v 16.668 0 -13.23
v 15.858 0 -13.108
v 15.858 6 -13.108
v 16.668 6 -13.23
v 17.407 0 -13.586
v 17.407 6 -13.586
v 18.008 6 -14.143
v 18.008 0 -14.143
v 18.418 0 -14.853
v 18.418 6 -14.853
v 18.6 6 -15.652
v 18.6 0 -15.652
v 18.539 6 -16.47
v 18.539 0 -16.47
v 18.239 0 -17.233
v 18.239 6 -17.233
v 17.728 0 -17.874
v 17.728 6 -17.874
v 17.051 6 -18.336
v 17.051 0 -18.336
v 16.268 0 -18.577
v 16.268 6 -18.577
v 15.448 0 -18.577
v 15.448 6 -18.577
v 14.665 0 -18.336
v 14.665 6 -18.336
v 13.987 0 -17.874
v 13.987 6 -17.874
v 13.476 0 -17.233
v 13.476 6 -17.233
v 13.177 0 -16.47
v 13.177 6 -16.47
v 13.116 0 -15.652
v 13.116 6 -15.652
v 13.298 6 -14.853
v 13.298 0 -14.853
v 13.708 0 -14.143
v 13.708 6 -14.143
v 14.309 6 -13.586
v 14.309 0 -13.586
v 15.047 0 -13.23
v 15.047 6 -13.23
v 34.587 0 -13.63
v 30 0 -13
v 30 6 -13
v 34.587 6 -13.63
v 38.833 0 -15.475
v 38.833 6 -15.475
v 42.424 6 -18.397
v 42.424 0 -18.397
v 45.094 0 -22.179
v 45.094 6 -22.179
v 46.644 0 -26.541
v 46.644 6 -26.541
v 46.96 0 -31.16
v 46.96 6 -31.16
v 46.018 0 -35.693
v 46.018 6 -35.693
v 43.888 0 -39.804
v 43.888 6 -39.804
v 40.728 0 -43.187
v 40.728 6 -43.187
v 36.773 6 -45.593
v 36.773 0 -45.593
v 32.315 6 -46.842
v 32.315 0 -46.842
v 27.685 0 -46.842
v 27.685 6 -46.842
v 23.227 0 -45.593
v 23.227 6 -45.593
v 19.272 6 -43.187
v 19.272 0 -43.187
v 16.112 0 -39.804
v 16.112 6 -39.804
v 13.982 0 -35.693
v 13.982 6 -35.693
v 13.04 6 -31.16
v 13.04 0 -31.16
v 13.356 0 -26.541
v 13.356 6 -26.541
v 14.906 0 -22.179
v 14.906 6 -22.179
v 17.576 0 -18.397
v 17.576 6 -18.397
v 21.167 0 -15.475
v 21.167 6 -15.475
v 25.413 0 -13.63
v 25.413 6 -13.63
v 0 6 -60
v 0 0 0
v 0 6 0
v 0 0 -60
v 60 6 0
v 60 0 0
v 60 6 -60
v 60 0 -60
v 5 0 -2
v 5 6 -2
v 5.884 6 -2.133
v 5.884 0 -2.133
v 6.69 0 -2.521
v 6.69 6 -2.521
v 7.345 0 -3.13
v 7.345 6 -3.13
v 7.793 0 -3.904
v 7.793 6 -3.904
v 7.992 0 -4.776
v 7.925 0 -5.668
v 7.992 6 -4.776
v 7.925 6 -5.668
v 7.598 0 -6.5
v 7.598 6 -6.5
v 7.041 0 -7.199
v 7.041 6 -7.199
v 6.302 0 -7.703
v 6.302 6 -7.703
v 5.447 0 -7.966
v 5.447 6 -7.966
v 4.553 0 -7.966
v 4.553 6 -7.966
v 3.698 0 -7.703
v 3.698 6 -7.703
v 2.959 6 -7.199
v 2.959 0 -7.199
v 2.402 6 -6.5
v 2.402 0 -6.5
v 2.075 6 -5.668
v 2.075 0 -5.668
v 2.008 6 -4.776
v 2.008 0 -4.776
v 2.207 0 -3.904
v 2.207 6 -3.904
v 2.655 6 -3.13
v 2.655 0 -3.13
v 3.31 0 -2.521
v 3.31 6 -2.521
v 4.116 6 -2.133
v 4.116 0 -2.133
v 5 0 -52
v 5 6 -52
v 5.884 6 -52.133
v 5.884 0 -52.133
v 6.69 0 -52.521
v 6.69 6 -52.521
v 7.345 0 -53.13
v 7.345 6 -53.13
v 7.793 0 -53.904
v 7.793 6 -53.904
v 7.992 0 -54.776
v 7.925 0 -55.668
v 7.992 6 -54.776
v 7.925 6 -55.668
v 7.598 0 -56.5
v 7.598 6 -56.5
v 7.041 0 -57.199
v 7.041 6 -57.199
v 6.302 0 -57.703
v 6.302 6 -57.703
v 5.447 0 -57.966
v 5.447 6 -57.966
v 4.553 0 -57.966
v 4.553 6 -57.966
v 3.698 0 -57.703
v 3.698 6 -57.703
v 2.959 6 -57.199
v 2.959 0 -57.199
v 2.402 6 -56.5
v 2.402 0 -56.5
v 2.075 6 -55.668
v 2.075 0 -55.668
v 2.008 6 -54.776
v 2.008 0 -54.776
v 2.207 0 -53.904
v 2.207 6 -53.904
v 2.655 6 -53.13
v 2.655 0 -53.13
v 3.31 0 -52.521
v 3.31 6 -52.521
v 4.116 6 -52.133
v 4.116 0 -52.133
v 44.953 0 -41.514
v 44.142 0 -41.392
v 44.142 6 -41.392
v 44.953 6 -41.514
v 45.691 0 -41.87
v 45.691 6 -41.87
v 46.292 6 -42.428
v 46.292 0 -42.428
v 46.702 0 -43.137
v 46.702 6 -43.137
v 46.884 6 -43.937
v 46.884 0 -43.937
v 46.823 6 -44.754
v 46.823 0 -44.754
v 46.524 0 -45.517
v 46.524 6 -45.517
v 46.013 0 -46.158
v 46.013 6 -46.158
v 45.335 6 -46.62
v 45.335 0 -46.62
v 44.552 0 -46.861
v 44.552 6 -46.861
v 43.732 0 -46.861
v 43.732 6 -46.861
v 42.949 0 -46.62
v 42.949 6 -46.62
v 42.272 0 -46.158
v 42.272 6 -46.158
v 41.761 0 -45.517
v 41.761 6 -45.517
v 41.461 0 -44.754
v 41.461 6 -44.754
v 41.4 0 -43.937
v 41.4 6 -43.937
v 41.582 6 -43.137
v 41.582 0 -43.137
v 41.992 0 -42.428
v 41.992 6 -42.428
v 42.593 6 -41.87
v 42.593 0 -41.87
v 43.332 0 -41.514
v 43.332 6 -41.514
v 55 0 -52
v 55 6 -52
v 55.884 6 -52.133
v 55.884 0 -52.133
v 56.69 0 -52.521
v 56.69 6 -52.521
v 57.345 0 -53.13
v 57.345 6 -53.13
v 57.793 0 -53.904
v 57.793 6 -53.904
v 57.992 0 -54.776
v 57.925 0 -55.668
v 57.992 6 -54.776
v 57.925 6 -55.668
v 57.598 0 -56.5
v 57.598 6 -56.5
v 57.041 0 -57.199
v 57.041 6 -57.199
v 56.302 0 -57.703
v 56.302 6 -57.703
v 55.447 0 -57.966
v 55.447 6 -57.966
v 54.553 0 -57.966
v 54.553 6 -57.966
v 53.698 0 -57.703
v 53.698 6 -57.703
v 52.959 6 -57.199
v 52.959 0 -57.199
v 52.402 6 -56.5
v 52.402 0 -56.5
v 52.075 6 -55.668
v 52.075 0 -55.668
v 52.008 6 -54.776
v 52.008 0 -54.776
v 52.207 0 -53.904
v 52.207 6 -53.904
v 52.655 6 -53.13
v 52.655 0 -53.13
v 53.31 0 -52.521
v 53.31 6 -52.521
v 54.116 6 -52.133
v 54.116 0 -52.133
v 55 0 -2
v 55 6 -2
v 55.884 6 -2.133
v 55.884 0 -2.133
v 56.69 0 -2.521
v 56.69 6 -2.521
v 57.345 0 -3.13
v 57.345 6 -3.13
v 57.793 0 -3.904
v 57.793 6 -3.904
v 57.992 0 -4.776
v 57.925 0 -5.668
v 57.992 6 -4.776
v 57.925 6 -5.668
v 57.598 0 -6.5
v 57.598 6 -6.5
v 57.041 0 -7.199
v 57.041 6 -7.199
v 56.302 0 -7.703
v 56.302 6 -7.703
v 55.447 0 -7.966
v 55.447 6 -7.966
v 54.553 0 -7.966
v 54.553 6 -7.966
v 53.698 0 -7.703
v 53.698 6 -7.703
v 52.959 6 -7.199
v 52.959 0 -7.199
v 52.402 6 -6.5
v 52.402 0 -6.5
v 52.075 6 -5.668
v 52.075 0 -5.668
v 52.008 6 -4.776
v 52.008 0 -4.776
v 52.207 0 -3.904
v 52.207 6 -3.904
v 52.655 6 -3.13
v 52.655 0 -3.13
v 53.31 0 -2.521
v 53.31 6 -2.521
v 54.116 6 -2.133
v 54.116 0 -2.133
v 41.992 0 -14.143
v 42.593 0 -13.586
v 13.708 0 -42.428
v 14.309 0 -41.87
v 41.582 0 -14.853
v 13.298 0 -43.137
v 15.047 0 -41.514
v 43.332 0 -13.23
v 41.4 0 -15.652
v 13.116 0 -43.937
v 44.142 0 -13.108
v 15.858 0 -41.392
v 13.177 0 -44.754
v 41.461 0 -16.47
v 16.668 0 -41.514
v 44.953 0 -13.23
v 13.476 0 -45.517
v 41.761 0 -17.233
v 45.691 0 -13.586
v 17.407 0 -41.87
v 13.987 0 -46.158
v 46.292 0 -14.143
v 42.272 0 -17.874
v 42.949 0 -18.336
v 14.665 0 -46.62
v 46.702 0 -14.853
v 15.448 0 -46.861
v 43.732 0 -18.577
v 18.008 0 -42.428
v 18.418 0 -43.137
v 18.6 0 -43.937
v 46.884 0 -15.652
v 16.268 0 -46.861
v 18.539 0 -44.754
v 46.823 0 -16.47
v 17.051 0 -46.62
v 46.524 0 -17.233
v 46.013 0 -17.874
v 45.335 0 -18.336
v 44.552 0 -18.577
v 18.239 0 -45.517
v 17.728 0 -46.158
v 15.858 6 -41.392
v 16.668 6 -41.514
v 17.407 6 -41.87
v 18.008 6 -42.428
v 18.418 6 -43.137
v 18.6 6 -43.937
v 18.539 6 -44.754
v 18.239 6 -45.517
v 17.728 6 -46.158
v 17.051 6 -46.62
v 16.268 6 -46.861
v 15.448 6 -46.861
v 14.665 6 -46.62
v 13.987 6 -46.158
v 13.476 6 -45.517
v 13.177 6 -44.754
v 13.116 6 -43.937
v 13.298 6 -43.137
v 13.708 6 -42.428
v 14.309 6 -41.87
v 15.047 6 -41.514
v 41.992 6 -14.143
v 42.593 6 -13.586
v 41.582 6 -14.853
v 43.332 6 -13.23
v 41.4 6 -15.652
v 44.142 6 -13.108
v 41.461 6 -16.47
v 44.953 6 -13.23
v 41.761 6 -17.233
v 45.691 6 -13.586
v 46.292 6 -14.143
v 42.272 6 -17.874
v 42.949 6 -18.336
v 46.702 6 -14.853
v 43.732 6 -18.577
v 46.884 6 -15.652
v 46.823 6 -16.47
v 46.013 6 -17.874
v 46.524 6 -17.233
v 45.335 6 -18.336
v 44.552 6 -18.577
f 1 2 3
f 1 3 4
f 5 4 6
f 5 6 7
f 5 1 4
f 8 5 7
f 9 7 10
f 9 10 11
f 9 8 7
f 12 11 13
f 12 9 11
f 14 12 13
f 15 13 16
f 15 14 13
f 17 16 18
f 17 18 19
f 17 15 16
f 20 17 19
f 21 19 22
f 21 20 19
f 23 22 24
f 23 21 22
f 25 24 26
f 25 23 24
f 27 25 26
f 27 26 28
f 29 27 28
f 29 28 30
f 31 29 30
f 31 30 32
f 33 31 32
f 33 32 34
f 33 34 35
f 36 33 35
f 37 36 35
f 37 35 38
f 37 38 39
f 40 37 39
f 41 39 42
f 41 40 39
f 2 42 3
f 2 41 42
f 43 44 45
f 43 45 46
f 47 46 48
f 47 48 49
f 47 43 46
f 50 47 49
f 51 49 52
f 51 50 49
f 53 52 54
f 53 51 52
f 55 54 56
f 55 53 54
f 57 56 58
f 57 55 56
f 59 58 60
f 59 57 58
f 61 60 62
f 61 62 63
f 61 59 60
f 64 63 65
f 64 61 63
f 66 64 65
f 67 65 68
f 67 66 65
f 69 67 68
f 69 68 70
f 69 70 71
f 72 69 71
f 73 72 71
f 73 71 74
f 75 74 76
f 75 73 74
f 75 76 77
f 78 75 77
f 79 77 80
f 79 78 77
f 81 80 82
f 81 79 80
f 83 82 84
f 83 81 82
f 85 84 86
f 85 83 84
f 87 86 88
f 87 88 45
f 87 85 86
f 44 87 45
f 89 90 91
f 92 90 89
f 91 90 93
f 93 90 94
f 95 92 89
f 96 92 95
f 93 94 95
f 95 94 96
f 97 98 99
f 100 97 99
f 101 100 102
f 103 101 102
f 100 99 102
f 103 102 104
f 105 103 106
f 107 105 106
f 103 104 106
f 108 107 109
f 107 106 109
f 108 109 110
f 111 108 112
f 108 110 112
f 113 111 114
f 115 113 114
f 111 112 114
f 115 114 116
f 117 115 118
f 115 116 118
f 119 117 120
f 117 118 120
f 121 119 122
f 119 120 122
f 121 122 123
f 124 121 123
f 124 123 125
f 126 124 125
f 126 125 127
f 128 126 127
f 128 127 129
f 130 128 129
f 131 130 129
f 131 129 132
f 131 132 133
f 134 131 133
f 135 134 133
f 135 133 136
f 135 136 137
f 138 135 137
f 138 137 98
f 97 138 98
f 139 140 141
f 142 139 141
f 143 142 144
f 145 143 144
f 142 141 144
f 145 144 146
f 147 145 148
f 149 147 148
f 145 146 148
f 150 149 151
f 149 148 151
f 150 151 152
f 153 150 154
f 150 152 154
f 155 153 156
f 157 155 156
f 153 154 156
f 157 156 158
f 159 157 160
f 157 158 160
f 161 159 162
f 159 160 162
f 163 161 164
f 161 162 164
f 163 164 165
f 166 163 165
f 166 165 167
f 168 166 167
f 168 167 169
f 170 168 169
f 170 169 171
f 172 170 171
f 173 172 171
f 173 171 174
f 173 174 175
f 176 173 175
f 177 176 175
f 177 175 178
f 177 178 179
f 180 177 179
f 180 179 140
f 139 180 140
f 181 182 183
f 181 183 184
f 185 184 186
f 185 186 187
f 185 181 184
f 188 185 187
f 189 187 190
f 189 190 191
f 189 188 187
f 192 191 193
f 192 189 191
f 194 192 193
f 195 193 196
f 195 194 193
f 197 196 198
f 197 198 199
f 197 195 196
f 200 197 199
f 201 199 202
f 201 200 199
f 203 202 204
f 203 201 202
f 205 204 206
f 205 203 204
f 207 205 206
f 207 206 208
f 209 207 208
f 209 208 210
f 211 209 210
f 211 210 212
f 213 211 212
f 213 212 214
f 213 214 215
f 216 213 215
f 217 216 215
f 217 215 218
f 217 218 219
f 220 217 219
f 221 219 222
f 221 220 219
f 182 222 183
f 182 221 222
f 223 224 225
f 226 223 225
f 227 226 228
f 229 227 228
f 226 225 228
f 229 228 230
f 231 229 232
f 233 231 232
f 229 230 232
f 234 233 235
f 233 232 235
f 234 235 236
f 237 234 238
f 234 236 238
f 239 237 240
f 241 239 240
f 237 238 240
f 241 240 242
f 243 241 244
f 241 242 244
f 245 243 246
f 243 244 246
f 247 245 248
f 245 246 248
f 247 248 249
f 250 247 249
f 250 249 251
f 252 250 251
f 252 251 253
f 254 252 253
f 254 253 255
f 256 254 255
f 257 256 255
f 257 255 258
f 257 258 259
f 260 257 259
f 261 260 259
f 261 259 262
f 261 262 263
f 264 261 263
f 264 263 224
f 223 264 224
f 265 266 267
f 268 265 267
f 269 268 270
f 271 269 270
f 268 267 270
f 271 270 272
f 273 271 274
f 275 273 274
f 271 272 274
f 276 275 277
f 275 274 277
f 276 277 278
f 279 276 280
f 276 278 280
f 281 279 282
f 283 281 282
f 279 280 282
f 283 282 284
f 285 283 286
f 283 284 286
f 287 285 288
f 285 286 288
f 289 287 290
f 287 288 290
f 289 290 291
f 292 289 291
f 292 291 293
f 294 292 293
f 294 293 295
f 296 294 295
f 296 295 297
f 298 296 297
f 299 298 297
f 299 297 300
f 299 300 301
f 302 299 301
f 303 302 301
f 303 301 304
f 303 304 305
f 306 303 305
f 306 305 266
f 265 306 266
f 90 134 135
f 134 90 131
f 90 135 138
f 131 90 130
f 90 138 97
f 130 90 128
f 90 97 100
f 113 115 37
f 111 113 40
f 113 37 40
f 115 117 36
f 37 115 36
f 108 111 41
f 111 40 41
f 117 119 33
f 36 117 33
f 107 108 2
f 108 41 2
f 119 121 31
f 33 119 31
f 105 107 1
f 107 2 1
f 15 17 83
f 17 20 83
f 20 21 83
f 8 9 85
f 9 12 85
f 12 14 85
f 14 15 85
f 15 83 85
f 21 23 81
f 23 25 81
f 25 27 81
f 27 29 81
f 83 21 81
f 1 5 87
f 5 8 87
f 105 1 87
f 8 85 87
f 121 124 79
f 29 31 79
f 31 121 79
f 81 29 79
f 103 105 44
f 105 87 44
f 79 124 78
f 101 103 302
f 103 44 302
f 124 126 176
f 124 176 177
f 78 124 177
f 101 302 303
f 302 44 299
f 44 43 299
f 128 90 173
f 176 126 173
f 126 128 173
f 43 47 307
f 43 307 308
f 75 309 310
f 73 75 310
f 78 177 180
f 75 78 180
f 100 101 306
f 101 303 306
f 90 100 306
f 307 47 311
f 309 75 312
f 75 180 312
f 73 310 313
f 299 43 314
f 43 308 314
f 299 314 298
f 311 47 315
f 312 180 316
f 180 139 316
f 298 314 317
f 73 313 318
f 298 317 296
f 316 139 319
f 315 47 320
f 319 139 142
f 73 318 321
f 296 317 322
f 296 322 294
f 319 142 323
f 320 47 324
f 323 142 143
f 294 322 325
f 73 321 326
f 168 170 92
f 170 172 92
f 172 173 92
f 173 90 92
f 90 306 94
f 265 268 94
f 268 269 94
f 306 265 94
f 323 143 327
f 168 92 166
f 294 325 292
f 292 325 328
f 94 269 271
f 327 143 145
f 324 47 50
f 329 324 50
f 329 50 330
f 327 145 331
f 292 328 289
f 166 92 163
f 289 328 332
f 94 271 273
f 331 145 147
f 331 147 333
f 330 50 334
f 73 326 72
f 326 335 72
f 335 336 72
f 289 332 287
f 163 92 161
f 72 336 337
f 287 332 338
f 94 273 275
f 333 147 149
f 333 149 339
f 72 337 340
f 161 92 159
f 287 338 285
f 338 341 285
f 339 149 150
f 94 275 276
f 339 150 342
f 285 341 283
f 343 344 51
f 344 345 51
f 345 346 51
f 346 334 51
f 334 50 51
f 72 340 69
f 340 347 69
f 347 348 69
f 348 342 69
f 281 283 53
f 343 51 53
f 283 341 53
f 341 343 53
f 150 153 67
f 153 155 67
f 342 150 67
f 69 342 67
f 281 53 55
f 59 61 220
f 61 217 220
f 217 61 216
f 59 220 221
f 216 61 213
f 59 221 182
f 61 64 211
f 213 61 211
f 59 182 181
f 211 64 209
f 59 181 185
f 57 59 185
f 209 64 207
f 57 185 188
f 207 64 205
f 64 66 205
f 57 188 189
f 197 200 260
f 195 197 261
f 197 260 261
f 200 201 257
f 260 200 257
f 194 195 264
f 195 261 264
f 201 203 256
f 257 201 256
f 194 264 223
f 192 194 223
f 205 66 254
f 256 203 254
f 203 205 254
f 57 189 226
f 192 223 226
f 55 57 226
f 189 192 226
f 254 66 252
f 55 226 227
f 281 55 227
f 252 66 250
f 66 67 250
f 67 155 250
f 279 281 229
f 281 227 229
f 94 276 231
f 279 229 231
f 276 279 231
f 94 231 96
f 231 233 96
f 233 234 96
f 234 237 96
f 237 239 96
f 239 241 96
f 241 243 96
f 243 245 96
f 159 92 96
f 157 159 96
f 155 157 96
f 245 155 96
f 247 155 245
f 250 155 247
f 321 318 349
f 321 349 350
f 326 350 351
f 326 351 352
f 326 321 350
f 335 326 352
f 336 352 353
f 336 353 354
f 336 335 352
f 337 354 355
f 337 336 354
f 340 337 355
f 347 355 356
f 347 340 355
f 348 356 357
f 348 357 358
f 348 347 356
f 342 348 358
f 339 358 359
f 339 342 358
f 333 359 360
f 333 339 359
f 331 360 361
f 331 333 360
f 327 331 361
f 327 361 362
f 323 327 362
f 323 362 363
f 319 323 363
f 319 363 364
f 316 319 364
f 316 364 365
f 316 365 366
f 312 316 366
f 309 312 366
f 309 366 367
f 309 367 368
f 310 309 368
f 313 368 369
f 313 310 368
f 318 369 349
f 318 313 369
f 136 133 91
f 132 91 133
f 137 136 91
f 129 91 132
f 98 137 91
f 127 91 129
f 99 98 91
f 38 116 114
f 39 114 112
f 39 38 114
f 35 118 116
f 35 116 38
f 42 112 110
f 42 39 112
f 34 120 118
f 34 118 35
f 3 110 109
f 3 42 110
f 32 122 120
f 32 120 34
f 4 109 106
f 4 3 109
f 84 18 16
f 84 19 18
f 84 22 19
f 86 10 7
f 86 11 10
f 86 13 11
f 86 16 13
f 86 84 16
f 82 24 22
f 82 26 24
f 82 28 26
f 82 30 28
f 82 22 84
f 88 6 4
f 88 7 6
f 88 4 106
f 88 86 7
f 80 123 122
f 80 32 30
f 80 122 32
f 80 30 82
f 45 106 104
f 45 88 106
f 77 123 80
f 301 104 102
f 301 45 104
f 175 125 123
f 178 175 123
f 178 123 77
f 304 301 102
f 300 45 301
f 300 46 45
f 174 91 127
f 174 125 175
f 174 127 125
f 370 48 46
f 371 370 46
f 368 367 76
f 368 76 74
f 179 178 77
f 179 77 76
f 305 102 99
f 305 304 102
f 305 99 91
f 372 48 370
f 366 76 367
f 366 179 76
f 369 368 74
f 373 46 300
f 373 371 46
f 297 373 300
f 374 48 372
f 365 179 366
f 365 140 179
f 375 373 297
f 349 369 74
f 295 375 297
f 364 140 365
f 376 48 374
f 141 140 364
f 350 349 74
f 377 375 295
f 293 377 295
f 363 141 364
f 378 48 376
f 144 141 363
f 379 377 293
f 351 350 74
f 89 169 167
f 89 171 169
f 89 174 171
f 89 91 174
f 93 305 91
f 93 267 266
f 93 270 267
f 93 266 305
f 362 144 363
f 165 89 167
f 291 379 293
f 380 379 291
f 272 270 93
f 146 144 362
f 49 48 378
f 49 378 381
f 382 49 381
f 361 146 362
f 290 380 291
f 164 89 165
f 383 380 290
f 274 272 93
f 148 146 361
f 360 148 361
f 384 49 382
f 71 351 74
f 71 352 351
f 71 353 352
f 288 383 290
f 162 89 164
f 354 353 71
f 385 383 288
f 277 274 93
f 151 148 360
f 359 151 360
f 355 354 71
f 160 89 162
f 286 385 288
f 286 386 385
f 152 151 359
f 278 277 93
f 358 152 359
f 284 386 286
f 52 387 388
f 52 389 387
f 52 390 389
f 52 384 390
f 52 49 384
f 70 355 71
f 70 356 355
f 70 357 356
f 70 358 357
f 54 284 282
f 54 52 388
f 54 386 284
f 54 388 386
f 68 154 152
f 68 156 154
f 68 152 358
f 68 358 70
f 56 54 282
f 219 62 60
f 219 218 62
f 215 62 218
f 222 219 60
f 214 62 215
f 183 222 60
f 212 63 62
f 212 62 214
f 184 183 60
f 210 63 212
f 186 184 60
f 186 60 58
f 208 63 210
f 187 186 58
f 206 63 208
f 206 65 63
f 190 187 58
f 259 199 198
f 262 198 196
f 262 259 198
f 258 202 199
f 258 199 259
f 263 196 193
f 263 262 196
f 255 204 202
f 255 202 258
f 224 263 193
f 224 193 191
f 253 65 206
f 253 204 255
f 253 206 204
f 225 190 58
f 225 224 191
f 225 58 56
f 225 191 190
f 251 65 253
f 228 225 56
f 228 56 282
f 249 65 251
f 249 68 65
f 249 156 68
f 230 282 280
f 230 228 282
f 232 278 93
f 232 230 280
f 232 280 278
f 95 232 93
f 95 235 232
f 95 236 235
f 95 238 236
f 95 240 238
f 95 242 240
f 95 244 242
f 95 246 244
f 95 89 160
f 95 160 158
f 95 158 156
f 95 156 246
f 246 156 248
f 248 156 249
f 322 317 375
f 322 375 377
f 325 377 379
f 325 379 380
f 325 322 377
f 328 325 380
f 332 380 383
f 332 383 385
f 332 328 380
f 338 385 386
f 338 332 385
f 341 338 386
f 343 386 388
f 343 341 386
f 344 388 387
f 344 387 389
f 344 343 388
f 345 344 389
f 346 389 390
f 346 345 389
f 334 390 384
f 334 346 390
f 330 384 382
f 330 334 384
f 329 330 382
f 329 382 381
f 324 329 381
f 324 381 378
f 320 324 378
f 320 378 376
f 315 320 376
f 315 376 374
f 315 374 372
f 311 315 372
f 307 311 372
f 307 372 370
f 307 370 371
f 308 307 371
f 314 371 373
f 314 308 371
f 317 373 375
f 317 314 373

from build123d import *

# Parameters (mm, degrees)
SKETCH1_W           = 60
SKETCH1_H           = 60
SKETCH1_R           = 2.75
SKETCH1_R_2         = 17
BOSS_EXTRUDE1_DEPTH = 6
SKETCH3_R           = 3
CUT_EXTRUDE1_DEPTH  = 10


with BuildPart() as part:
    # Sketch1 → Boss-Extrude1 (new body)
    with BuildSketch(Plane(origin=(0, 0, 0), x_dir=(1, 0, 0), z_dir=(0, 1, 0))):
        with Locations((30, 30)):
            Rectangle(SKETCH1_W, SKETCH1_H)
        with Locations(Location((15.857864376, 44.142135624, 0), (0, 0, 270))):
            Circle(SKETCH1_R, mode=Mode.SUBTRACT)
        with Locations(Location((30, 30, 0), (0, 0, 270))):
            Circle(SKETCH1_R_2, mode=Mode.SUBTRACT)
        with Locations(Location((44.142135624, 44.142135624, 0), (0, 0, 270))):
            Circle(SKETCH1_R, mode=Mode.SUBTRACT)
        with Locations(Location((44.142135624, 15.857864376, 0), (0, 0, 270))):
            Circle(SKETCH1_R, mode=Mode.SUBTRACT)
        with Locations(Location((15.857864376, 15.857864376, 0), (0, 0, 270))):
            Circle(SKETCH1_R, mode=Mode.SUBTRACT)
    extrude(amount=BOSS_EXTRUDE1_DEPTH)

    # Sketch3 → Cut-Extrude1 (cut)
    with BuildSketch(Plane(origin=(0, 6, 0), x_dir=(1, 0, 0), z_dir=(0, 1, 0))):
        with Locations(Location((5, 55, 0), (0, 0, 270))):
            Circle(SKETCH3_R)
        with Locations(Location((55, 55, 0), (0, 0, 270))):
            Circle(SKETCH3_R)
        with Locations(Location((55, 5, 0), (0, 0, 270))):
            Circle(SKETCH3_R)
        with Locations(Location((5, 5, 0), (0, 0, 270))):
            Circle(SKETCH3_R)
    extrude(amount=-CUT_EXTRUDE1_DEPTH, mode=Mode.SUBTRACT)


solid = part.part
